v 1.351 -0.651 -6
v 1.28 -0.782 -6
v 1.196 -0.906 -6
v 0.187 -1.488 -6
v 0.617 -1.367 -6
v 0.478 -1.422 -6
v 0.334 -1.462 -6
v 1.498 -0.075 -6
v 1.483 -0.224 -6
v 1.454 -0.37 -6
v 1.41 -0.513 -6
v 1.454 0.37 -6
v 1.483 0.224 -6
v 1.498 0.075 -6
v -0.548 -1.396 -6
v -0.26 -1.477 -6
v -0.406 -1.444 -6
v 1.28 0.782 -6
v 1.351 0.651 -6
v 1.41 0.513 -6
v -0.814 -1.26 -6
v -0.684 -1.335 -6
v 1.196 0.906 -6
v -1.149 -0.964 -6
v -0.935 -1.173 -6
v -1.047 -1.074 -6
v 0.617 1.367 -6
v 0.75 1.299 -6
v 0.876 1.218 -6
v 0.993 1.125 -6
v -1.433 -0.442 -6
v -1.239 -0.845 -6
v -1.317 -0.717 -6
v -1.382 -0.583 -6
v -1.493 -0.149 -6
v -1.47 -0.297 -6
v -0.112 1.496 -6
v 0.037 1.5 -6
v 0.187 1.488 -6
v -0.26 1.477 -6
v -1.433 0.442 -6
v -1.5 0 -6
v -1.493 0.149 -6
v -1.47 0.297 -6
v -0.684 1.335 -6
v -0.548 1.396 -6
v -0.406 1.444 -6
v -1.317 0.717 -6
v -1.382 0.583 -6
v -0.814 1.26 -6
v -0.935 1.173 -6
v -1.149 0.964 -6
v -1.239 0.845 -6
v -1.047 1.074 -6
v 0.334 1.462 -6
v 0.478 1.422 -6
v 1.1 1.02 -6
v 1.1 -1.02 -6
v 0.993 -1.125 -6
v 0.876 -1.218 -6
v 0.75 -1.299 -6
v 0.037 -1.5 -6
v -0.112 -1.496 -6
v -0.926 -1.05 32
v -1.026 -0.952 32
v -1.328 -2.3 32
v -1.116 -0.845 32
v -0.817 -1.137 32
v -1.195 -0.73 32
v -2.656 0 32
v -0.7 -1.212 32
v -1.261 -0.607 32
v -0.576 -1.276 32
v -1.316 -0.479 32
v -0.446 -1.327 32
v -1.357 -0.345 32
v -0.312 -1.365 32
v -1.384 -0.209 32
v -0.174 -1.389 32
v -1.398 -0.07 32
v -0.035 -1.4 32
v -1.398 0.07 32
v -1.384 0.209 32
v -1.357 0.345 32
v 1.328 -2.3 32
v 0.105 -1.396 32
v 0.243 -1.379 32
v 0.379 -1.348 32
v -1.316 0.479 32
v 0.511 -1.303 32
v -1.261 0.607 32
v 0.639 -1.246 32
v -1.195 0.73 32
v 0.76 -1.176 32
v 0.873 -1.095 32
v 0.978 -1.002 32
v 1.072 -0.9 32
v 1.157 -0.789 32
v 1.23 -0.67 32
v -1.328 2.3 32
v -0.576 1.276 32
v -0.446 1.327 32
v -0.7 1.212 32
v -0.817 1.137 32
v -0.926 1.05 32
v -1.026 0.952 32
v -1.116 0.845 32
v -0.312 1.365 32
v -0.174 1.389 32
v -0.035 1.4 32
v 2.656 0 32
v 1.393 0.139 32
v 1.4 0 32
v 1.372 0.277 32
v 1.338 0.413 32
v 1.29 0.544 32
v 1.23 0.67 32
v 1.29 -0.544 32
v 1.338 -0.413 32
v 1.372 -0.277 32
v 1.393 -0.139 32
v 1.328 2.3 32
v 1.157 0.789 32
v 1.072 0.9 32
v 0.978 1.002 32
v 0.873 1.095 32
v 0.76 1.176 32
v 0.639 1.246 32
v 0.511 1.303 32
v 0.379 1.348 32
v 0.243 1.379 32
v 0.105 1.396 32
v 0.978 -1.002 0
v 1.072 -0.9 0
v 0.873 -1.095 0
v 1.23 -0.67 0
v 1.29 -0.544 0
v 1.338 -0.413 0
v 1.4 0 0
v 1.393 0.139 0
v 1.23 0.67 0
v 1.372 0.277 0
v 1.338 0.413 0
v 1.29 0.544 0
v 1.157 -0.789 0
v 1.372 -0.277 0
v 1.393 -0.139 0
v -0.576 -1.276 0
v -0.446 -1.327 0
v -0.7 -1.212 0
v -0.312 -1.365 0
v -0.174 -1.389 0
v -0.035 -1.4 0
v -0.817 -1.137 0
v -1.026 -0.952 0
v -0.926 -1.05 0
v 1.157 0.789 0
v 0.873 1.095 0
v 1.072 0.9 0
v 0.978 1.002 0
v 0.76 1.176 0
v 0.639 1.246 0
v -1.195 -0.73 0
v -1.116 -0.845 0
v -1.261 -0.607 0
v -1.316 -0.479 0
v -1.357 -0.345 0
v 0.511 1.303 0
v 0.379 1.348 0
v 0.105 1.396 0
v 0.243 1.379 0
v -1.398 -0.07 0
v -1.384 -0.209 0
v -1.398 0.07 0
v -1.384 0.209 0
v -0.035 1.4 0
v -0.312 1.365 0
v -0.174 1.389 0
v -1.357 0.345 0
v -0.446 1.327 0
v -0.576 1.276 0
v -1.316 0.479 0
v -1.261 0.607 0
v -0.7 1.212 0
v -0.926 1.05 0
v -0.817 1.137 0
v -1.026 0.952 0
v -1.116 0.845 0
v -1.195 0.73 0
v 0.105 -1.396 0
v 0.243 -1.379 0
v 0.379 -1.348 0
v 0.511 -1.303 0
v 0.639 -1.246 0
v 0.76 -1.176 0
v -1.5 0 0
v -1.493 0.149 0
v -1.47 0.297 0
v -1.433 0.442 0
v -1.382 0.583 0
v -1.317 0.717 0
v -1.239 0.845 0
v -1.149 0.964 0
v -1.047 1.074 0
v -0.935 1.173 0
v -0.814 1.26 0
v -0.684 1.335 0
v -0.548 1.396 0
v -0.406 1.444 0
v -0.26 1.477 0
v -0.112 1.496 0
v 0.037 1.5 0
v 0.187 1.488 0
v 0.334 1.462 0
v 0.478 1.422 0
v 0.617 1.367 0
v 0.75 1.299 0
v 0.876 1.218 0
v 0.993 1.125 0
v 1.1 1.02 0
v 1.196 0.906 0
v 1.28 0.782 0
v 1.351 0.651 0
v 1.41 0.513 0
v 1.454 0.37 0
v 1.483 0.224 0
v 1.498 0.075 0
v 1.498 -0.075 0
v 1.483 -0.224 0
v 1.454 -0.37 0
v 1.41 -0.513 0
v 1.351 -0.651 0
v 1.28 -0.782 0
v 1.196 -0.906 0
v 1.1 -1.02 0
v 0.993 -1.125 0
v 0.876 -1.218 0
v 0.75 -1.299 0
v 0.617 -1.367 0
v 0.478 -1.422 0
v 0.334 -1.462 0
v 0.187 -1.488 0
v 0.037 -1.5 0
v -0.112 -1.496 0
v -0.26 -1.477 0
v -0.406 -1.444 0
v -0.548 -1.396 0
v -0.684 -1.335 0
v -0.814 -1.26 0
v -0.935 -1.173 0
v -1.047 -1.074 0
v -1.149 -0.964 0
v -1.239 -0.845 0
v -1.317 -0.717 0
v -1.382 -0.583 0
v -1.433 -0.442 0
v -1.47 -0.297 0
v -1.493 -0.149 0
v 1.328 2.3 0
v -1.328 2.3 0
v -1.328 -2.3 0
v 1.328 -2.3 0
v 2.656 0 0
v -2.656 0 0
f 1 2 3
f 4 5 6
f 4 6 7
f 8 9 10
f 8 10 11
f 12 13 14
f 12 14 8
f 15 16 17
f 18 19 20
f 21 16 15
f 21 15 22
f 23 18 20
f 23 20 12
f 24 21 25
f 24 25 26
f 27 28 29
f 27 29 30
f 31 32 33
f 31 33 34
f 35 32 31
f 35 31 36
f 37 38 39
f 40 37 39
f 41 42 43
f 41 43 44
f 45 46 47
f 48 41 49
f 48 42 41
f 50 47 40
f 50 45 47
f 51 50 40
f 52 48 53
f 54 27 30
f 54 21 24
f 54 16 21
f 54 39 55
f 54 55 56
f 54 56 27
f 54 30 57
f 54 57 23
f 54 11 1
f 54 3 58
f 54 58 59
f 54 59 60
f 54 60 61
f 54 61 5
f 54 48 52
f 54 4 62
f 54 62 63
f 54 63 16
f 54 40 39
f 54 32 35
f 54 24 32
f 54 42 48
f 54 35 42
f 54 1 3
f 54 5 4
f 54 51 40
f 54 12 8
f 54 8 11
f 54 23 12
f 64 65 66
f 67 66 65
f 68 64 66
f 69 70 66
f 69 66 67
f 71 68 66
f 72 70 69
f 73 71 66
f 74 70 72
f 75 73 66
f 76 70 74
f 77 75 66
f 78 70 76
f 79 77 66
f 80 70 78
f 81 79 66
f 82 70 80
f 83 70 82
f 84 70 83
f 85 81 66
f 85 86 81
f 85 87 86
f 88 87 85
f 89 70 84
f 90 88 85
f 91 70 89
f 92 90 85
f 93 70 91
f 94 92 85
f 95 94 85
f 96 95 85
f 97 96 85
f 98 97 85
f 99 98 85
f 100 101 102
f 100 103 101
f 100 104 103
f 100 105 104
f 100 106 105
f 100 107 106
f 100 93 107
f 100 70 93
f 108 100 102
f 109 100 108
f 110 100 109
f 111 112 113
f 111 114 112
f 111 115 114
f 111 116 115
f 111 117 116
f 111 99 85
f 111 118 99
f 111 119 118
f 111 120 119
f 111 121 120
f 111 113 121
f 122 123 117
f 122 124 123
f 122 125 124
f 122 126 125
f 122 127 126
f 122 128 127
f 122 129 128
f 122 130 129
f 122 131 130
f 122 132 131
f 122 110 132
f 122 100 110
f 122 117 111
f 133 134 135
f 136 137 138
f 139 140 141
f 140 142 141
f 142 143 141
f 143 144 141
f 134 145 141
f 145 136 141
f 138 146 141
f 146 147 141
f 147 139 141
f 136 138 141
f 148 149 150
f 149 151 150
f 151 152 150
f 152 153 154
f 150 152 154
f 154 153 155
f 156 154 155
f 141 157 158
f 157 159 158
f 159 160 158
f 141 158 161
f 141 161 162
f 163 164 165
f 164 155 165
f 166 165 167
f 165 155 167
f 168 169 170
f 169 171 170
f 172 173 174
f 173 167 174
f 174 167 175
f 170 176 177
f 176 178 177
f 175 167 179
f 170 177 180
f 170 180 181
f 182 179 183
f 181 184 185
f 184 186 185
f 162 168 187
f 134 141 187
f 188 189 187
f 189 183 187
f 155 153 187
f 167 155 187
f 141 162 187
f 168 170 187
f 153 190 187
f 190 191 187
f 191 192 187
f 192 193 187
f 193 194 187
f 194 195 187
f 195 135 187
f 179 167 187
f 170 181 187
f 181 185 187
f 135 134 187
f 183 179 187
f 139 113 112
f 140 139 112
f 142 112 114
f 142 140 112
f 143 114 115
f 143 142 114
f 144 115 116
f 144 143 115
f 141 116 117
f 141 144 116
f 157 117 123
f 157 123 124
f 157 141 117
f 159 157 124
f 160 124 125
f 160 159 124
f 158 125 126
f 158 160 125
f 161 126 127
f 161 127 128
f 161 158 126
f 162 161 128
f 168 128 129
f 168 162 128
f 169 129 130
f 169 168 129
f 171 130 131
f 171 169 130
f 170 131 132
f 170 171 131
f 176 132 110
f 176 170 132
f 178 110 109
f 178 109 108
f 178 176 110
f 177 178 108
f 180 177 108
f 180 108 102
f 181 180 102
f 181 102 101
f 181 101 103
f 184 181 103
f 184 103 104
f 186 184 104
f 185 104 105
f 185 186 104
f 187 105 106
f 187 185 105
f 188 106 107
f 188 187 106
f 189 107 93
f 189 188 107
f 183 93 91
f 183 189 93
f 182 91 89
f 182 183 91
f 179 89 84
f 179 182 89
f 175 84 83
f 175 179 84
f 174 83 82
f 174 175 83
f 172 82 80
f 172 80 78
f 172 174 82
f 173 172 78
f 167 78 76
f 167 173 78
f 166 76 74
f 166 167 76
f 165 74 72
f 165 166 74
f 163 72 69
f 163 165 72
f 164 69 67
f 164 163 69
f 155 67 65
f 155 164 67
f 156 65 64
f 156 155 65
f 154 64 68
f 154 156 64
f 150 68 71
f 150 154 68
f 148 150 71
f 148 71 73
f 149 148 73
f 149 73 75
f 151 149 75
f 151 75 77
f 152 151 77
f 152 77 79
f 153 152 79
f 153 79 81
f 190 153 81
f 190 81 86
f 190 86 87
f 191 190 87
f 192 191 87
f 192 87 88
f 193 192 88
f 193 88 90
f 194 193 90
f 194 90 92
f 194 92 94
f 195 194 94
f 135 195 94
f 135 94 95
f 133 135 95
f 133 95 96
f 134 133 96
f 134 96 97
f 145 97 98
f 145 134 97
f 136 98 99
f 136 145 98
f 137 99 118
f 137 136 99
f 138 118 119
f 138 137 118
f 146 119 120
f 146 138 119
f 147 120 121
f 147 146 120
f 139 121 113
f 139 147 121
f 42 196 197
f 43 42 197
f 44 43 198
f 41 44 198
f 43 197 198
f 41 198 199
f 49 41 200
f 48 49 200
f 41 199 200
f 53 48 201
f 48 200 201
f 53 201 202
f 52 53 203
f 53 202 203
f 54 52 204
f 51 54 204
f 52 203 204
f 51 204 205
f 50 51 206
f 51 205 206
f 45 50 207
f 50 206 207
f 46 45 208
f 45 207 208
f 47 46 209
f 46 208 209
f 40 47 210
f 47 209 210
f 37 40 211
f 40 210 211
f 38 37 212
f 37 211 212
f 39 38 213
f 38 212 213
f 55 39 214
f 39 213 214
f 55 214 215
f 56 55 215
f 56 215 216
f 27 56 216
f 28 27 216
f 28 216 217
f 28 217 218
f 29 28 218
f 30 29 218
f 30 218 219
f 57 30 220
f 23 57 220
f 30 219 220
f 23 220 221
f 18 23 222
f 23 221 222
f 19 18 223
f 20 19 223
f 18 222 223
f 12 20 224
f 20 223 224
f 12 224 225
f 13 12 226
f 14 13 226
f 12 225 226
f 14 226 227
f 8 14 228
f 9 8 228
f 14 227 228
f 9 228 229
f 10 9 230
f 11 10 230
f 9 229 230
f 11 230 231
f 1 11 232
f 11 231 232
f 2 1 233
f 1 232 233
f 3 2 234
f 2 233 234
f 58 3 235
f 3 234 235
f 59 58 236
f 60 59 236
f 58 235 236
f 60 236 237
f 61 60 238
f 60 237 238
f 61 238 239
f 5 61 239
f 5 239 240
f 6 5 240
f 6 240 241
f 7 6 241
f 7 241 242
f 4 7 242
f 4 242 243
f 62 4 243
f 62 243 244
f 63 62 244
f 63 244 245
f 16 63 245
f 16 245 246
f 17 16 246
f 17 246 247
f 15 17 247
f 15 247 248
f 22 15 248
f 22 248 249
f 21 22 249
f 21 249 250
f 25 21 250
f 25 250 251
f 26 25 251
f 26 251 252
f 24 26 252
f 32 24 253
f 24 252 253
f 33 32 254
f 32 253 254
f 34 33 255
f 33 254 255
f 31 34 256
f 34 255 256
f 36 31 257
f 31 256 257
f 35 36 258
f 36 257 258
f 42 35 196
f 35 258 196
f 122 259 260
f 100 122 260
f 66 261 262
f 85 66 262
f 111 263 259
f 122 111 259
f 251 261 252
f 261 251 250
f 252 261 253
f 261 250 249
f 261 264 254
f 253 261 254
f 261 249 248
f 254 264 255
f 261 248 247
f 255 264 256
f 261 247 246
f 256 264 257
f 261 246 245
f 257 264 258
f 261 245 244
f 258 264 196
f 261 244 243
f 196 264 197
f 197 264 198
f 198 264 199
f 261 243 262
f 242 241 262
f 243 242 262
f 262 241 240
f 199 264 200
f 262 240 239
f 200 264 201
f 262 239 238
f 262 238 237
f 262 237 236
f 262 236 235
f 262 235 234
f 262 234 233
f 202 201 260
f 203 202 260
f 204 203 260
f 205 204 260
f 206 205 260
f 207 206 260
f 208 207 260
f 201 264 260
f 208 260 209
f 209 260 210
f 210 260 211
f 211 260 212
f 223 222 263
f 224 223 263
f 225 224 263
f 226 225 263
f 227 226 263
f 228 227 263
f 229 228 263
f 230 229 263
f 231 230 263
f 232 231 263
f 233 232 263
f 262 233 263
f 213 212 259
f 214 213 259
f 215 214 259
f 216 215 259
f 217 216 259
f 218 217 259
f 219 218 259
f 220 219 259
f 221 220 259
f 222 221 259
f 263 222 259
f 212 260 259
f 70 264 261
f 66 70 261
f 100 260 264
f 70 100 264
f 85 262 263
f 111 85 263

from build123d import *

# Parameters (mm, degrees)
SKETCH_1_R      = 1.4
EXTRUDE_1_DEPTH = 32
SKETCH_2_R      = 1.5
EXTRUDE_2_DEPTH = 6


with BuildPart() as part:
    # 草图1 → 凸台-拉伸1 (new body)
    with BuildSketch(Plane.XY):
        Polygon((2.655811238, 0), (1.327905619, 2.3), (-1.327905619, 2.3), (-2.655811238, 0), (-1.327905619, -2.3), (1.327905619, -2.3), align=None)
        Circle(SKETCH_1_R, mode=Mode.SUBTRACT)
    extrude(amount=EXTRUDE_1_DEPTH)

    # 草图2 → 凸台-拉伸2 (add)
    with BuildSketch(Plane(origin=(0, 0, 0), x_dir=(-1, 0, 0), z_dir=(0, 0, -1))):
        Circle(SKETCH_2_R)
    extrude(amount=EXTRUDE_2_DEPTH)


solid = part.part
